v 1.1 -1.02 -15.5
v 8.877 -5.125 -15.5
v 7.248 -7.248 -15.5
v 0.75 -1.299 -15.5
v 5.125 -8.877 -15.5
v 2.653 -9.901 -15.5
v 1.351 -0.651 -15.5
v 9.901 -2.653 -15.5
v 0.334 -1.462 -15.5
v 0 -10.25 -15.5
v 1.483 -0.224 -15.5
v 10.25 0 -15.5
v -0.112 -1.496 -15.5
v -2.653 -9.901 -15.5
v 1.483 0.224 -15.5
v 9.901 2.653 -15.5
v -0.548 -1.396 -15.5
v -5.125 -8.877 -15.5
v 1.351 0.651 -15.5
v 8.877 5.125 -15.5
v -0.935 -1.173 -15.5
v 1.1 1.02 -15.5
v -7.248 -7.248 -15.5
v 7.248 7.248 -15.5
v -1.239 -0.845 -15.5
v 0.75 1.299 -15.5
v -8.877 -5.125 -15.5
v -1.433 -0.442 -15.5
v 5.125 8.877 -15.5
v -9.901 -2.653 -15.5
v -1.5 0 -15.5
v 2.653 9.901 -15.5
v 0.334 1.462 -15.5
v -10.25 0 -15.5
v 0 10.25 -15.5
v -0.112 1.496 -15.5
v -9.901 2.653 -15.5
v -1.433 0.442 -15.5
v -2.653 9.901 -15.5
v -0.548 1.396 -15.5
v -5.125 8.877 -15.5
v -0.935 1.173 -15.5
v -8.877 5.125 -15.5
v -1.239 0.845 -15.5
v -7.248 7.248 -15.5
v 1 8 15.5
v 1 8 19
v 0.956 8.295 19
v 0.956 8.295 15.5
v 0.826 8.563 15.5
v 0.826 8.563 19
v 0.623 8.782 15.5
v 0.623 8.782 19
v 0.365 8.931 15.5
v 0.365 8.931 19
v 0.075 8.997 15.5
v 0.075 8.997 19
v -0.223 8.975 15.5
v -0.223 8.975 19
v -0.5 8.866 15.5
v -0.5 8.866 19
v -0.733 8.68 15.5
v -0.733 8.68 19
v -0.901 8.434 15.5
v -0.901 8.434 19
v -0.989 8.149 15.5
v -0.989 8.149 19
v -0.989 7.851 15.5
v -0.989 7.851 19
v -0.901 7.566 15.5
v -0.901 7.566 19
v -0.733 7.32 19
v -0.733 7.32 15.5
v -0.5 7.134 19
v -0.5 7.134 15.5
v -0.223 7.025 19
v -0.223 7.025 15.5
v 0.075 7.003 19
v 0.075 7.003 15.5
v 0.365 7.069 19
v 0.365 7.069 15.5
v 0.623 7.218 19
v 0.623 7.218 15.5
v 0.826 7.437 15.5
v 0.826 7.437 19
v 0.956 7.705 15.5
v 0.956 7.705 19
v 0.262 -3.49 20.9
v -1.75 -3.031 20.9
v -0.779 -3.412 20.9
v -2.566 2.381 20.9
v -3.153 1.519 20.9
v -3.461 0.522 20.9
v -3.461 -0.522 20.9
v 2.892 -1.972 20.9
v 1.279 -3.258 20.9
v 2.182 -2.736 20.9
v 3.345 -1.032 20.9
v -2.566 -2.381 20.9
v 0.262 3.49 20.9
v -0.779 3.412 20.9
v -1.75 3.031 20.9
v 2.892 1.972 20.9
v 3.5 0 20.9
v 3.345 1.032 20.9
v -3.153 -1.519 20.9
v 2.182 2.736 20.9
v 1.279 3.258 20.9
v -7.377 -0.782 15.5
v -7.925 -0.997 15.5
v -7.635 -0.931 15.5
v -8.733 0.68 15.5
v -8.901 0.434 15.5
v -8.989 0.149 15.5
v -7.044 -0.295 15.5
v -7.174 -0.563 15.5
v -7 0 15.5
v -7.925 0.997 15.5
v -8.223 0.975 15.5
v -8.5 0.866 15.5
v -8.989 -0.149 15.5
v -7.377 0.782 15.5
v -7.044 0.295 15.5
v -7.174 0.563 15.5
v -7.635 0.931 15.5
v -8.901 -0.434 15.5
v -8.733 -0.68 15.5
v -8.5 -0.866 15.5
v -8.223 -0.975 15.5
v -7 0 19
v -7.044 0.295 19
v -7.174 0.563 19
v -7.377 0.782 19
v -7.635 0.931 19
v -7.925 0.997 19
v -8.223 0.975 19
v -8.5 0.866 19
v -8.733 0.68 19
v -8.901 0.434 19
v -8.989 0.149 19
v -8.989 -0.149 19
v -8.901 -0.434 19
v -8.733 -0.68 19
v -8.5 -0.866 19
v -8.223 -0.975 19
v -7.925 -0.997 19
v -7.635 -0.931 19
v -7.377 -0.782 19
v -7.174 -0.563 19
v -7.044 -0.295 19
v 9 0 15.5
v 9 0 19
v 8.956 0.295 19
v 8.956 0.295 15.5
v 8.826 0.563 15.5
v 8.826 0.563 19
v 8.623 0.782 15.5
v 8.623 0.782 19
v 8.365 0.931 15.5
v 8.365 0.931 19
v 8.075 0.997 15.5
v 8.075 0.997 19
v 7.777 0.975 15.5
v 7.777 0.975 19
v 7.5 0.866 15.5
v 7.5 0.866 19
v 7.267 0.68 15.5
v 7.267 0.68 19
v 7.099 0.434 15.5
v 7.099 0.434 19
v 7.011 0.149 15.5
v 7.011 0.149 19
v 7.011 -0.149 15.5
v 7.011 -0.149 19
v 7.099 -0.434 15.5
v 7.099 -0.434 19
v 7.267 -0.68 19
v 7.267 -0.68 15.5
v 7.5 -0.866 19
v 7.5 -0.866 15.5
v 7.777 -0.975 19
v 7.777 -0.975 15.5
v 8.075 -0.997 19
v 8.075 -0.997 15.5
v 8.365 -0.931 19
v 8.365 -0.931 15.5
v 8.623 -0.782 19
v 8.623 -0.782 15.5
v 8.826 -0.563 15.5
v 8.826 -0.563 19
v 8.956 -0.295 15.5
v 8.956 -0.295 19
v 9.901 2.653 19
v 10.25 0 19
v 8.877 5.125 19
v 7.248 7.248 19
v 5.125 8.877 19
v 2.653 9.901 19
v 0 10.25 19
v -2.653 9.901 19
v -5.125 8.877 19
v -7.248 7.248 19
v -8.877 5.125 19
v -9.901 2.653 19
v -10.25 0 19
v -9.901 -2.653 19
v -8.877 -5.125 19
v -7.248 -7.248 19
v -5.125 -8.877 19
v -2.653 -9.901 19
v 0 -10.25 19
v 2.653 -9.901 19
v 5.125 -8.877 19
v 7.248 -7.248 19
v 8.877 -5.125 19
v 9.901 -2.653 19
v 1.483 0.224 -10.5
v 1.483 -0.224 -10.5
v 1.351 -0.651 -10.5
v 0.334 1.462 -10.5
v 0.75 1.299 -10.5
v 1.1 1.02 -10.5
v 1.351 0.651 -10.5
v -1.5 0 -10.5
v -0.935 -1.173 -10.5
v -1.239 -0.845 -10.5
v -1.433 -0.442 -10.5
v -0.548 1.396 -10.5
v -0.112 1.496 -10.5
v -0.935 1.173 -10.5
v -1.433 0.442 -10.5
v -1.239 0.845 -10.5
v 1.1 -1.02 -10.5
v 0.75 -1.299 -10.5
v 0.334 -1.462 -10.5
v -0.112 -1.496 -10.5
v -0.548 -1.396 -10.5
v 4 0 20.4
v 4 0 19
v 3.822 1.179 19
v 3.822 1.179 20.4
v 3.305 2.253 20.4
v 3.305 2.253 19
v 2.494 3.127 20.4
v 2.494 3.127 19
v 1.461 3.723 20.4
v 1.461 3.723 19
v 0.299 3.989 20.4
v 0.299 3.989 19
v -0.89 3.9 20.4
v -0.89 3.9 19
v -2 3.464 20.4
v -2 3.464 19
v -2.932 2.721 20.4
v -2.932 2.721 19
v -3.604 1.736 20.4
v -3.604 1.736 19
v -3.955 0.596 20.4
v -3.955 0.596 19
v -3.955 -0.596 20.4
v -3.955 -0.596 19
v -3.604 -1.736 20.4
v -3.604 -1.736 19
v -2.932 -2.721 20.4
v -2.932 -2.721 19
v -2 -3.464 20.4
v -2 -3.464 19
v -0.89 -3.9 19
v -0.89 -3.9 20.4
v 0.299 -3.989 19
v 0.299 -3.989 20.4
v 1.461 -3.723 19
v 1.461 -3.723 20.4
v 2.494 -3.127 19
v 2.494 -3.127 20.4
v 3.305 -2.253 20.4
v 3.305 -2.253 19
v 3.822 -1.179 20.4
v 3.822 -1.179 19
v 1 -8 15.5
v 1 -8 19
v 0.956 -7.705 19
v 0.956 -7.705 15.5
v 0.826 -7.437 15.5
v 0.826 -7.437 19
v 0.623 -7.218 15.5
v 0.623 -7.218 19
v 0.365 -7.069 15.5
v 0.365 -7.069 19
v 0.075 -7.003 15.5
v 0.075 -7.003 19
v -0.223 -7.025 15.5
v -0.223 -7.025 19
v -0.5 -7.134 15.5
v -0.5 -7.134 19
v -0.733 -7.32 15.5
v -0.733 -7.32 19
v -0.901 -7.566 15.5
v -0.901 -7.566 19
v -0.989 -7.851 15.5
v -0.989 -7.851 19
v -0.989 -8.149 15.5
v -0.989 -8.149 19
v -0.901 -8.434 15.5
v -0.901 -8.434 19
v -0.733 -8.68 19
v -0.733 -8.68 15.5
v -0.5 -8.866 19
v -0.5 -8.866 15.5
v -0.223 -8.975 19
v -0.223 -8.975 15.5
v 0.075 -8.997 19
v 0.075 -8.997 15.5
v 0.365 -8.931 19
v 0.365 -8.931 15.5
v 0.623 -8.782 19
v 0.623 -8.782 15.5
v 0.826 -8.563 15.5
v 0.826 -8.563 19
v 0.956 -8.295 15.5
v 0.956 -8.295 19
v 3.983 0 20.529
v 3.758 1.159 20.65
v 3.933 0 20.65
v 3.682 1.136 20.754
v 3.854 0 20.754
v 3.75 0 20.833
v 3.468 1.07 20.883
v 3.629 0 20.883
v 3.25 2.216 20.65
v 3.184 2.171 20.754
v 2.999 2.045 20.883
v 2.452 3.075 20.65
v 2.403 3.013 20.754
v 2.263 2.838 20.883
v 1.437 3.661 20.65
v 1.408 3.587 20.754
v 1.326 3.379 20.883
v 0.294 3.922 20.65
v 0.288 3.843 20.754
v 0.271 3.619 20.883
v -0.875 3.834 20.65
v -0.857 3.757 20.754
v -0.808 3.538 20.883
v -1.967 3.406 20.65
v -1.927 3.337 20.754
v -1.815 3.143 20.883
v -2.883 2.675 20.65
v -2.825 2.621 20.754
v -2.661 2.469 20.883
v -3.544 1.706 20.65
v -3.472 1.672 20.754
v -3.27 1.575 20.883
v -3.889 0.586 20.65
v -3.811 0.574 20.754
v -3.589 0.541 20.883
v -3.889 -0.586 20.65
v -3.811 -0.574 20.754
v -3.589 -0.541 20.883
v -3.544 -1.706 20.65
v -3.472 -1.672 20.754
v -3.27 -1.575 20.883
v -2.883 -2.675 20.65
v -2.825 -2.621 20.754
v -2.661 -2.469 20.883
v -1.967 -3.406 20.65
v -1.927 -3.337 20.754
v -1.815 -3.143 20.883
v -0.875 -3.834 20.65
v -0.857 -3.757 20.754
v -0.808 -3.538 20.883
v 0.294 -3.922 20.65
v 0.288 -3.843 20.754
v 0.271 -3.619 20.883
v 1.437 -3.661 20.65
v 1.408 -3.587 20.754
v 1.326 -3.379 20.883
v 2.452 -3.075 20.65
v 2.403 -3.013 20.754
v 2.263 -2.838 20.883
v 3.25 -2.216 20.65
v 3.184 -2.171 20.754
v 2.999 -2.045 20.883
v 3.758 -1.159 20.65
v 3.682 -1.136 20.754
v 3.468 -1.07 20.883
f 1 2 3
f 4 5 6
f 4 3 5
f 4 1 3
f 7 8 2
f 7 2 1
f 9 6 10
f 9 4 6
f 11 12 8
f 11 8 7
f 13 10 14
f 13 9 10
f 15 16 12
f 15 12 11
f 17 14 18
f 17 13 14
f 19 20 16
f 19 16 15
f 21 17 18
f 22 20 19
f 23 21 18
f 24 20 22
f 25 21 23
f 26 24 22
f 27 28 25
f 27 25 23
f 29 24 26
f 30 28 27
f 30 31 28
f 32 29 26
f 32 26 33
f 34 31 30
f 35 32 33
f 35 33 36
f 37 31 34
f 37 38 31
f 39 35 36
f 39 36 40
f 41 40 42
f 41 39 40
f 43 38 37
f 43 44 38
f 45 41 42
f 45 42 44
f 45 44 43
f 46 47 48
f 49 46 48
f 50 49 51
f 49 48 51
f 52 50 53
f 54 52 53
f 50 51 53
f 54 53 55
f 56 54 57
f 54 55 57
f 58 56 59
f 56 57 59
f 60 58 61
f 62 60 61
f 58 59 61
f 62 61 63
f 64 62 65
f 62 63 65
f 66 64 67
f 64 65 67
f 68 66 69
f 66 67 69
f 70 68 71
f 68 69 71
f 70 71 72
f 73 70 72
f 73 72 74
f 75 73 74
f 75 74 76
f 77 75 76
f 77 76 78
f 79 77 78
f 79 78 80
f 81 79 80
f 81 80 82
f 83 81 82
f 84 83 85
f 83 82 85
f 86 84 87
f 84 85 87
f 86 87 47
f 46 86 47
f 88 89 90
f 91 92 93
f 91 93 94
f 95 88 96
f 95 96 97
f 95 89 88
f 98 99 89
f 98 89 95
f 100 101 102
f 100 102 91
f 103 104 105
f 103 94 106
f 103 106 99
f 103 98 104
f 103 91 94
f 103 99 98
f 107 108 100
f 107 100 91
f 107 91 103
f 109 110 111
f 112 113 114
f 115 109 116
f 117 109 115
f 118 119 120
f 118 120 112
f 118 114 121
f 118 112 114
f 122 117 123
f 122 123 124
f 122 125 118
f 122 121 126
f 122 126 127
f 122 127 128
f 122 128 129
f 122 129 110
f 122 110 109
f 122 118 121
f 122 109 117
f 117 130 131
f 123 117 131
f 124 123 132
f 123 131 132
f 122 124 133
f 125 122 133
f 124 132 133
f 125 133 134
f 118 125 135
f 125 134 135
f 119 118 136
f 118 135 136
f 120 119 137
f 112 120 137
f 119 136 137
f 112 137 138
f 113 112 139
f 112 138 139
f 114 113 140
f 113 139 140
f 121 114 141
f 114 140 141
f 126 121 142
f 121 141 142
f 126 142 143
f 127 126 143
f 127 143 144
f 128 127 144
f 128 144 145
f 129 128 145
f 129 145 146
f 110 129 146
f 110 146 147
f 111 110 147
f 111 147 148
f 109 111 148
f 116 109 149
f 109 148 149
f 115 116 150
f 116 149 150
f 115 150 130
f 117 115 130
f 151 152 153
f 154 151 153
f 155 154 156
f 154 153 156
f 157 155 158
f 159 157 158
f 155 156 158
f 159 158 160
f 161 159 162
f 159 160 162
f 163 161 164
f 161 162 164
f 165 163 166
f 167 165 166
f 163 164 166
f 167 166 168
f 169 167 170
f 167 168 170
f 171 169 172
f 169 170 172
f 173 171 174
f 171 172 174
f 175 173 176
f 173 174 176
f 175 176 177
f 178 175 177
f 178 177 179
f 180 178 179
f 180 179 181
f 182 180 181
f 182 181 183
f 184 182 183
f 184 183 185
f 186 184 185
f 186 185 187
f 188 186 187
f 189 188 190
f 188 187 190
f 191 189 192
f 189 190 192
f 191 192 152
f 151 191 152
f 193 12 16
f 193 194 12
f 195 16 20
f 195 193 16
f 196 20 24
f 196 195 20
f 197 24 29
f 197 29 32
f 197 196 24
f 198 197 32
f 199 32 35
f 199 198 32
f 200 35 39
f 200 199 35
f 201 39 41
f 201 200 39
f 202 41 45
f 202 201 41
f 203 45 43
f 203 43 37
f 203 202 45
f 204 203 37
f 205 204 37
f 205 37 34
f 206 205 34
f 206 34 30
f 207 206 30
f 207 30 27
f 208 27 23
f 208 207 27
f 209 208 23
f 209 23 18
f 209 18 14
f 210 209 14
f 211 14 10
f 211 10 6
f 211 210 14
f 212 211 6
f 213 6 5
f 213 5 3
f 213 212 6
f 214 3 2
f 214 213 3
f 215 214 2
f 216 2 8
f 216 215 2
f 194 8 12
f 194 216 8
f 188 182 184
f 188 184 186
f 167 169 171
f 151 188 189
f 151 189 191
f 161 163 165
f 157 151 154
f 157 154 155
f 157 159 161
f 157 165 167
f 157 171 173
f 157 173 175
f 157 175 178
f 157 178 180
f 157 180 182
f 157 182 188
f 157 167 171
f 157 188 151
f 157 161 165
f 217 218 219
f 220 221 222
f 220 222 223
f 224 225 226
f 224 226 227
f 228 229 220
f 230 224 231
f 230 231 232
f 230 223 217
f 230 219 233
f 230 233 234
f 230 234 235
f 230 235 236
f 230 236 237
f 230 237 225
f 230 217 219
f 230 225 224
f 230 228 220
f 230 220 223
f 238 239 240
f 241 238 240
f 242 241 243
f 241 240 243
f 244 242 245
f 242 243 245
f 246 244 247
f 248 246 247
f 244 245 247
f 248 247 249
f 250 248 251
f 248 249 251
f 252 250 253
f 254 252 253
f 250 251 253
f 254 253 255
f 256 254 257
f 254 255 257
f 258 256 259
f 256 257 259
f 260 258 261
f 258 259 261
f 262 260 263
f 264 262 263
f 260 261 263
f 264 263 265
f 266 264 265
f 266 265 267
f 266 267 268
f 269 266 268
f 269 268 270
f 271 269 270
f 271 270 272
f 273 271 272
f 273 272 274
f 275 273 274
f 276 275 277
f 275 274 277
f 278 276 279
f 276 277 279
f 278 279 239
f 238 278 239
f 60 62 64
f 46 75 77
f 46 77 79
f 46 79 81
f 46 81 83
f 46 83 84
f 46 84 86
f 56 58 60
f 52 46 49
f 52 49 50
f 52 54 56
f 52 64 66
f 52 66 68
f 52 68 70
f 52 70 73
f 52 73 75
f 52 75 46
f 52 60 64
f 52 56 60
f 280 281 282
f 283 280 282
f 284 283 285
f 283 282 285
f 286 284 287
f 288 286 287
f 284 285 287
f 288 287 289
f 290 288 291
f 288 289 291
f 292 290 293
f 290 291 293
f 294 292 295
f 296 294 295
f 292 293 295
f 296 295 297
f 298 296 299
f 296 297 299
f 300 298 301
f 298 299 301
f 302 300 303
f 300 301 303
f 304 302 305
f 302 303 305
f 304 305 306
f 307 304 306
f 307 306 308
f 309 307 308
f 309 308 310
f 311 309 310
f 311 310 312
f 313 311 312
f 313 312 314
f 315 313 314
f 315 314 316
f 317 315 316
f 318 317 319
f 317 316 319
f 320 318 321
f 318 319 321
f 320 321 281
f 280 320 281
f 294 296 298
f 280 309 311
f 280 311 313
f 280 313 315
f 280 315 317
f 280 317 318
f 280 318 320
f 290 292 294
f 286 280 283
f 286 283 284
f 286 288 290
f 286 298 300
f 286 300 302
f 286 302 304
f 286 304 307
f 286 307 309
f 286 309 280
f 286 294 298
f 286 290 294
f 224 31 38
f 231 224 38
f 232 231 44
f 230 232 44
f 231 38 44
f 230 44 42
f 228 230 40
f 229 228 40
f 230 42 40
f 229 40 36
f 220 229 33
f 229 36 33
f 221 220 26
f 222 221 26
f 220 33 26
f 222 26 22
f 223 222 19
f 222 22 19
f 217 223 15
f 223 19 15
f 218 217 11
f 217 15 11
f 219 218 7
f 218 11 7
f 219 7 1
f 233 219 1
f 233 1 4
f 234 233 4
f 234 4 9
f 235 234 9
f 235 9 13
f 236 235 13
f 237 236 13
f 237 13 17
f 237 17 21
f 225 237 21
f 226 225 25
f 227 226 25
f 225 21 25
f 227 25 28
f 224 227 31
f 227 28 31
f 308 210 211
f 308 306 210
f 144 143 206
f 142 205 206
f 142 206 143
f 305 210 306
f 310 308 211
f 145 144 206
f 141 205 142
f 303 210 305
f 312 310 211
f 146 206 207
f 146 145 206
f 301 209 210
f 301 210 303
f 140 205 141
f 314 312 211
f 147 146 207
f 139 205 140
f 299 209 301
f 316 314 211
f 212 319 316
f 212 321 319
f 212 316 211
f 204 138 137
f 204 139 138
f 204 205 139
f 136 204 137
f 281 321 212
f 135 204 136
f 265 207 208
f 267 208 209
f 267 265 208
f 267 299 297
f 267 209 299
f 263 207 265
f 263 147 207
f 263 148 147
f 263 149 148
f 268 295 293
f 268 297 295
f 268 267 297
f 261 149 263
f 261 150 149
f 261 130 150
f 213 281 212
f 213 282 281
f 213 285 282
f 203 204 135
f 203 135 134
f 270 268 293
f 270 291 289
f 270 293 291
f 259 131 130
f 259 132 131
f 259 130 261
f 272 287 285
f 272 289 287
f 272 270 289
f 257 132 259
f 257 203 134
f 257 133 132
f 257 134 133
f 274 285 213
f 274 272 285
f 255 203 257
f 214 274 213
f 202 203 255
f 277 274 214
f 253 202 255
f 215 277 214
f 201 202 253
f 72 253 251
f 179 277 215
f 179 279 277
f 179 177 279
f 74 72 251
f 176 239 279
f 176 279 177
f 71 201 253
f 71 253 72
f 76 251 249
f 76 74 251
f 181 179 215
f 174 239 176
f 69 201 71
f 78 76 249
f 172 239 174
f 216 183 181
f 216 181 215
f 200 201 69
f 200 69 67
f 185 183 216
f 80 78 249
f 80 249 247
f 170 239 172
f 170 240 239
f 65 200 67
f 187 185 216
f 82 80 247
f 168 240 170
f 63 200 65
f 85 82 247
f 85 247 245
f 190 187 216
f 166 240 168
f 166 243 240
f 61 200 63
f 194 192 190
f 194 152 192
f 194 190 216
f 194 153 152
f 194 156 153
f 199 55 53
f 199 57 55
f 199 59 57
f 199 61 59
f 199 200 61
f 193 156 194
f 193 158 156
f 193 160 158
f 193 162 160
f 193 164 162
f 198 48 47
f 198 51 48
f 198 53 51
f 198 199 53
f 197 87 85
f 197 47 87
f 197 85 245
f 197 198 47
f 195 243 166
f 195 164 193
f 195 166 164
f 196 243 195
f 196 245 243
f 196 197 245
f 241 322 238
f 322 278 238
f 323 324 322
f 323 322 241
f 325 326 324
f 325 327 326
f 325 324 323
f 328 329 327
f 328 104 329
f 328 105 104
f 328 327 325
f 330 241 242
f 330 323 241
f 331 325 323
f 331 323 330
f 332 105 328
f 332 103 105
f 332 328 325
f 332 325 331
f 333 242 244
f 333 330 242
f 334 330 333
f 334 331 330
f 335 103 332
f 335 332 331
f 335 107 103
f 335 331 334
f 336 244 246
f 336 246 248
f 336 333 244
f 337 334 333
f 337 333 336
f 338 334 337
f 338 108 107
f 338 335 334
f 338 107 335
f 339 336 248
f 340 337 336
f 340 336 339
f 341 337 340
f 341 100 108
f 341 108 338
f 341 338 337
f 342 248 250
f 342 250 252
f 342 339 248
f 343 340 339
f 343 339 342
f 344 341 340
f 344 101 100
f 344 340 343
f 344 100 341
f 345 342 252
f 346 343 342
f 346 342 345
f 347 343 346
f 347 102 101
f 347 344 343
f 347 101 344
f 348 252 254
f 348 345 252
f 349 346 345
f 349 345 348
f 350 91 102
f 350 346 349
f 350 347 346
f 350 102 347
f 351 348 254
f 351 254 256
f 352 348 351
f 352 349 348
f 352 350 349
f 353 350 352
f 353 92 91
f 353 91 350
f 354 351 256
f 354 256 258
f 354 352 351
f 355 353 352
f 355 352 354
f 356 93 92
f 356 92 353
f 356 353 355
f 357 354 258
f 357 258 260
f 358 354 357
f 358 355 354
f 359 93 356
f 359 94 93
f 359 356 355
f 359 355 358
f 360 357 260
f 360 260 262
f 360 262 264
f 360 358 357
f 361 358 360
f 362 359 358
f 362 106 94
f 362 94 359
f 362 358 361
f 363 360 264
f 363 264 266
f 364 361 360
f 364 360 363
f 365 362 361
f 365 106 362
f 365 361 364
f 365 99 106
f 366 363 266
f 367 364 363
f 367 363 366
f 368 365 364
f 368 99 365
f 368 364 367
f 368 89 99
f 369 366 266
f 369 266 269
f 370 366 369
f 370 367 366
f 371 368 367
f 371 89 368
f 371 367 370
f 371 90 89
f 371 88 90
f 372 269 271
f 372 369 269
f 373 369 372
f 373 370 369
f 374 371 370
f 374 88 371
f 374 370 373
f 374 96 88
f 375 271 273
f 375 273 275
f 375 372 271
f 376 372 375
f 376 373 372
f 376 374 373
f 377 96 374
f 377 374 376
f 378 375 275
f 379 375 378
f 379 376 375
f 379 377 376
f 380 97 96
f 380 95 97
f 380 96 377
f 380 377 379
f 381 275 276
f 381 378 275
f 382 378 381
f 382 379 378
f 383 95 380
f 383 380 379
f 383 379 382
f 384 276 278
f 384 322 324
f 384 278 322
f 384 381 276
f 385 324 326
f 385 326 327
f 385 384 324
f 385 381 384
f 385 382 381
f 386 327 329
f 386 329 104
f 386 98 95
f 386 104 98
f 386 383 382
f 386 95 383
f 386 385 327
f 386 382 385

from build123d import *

# Parameters (mm, degrees)
BOSS_EXTRUDE1_DEPTH      = 19
BOSS_EXTRUDE1_DEPTH_BACK = 19
SKETCH1_R                = 10.25
SKETCH2_R                = 4
BOSS_EXTRUDE2_DEPTH      = 1.9
BOSS_EXTRUDE3_START      = 1
SKETCH3_R                = 4
BOSS_EXTRUDE3_DEPTH      = 1
SKETCH4_R                = 1
CUT_EXTRUDE1_DEPTH       = 3.5
FILLET1_R                = 0.5
CUT_EXTRUDE3_DEPTH       = 5.5
CUT_EXTRUDE3_DEPTH_BACK  = 3.5
SKETCH7_R                = 10.25
SKETCH9_R                = 1.5
CUT_EXTRUDE5_DEPTH       = 5


with BuildPart() as part:
    # Sketch1 → Boss-Extrude1 (new, two sides: drawn at the far end of the back side and taken through both)
    with BuildSketch(Plane.XY.offset(-BOSS_EXTRUDE1_DEPTH_BACK)):
        Circle(SKETCH1_R)
    extrude(amount=BOSS_EXTRUDE1_DEPTH + BOSS_EXTRUDE1_DEPTH_BACK)

    # Sketch2 → Boss-Extrude2 (add)
    with BuildSketch(Plane.XY.offset(19)):
        Circle(SKETCH2_R)
    extrude(amount=BOSS_EXTRUDE2_DEPTH)

    # Sketch3 → Boss-Extrude3 (add)
    with BuildSketch(Plane(origin=(0, 0, -19), x_dir=(-1, 0, 0), z_dir=(0, 0, -1)).offset(BOSS_EXTRUDE3_START)):
        Circle(SKETCH3_R)
    extrude(amount=-BOSS_EXTRUDE3_DEPTH)

    # Sketch4 → Cut-Extrude1 (cut)
    with BuildSketch(Plane.XY.offset(19)):
        with Locations((8, 0)):
            Circle(SKETCH4_R)
        with Locations((0, 8)):
            Circle(SKETCH4_R)
        with Locations((0, -8)):
            Circle(SKETCH4_R)
        with Locations((-8, 0)):
            Circle(SKETCH4_R)
    cut_extrude1 = extrude(amount=-CUT_EXTRUDE1_DEPTH, mode=Mode.SUBTRACT)

    # Fillet1
    fillet1_edges = [part.edges().sort_by_distance(p)[0] for p in [
        (-4, 0, 20.9),
    ]]
    fillet(fillet1_edges, radius=FILLET1_R)

    # Mirror1: Cut-Extrude1 across plane
    add(cut_extrude1.mirror(Plane(origin=(0, 0, 0), x_dir=(1, 0, 0), z_dir=(0, 0, -1))), mode=Mode.SUBTRACT)

    # Sketch7 → Cut-Extrude3 (cut, two sides: drawn at the far end of the back side and taken through both)
    with BuildSketch(Plane(origin=(0, 0, -19), x_dir=(-1, 0, 0), z_dir=(0, 0, -1)).offset(-CUT_EXTRUDE3_DEPTH_BACK)):
        Circle(SKETCH7_R)
    extrude(amount=CUT_EXTRUDE3_DEPTH + CUT_EXTRUDE3_DEPTH_BACK, mode=Mode.SUBTRACT)

    # Sketch9 → Cut-Extrude5 (cut)
    with BuildSketch(Plane(origin=(0, 0, -15.5), x_dir=(-1, 0, 0), z_dir=(0, 0, -1))):
        Circle(SKETCH9_R)
    extrude(amount=-CUT_EXTRUDE5_DEPTH, mode=Mode.SUBTRACT)


solid = part.part
